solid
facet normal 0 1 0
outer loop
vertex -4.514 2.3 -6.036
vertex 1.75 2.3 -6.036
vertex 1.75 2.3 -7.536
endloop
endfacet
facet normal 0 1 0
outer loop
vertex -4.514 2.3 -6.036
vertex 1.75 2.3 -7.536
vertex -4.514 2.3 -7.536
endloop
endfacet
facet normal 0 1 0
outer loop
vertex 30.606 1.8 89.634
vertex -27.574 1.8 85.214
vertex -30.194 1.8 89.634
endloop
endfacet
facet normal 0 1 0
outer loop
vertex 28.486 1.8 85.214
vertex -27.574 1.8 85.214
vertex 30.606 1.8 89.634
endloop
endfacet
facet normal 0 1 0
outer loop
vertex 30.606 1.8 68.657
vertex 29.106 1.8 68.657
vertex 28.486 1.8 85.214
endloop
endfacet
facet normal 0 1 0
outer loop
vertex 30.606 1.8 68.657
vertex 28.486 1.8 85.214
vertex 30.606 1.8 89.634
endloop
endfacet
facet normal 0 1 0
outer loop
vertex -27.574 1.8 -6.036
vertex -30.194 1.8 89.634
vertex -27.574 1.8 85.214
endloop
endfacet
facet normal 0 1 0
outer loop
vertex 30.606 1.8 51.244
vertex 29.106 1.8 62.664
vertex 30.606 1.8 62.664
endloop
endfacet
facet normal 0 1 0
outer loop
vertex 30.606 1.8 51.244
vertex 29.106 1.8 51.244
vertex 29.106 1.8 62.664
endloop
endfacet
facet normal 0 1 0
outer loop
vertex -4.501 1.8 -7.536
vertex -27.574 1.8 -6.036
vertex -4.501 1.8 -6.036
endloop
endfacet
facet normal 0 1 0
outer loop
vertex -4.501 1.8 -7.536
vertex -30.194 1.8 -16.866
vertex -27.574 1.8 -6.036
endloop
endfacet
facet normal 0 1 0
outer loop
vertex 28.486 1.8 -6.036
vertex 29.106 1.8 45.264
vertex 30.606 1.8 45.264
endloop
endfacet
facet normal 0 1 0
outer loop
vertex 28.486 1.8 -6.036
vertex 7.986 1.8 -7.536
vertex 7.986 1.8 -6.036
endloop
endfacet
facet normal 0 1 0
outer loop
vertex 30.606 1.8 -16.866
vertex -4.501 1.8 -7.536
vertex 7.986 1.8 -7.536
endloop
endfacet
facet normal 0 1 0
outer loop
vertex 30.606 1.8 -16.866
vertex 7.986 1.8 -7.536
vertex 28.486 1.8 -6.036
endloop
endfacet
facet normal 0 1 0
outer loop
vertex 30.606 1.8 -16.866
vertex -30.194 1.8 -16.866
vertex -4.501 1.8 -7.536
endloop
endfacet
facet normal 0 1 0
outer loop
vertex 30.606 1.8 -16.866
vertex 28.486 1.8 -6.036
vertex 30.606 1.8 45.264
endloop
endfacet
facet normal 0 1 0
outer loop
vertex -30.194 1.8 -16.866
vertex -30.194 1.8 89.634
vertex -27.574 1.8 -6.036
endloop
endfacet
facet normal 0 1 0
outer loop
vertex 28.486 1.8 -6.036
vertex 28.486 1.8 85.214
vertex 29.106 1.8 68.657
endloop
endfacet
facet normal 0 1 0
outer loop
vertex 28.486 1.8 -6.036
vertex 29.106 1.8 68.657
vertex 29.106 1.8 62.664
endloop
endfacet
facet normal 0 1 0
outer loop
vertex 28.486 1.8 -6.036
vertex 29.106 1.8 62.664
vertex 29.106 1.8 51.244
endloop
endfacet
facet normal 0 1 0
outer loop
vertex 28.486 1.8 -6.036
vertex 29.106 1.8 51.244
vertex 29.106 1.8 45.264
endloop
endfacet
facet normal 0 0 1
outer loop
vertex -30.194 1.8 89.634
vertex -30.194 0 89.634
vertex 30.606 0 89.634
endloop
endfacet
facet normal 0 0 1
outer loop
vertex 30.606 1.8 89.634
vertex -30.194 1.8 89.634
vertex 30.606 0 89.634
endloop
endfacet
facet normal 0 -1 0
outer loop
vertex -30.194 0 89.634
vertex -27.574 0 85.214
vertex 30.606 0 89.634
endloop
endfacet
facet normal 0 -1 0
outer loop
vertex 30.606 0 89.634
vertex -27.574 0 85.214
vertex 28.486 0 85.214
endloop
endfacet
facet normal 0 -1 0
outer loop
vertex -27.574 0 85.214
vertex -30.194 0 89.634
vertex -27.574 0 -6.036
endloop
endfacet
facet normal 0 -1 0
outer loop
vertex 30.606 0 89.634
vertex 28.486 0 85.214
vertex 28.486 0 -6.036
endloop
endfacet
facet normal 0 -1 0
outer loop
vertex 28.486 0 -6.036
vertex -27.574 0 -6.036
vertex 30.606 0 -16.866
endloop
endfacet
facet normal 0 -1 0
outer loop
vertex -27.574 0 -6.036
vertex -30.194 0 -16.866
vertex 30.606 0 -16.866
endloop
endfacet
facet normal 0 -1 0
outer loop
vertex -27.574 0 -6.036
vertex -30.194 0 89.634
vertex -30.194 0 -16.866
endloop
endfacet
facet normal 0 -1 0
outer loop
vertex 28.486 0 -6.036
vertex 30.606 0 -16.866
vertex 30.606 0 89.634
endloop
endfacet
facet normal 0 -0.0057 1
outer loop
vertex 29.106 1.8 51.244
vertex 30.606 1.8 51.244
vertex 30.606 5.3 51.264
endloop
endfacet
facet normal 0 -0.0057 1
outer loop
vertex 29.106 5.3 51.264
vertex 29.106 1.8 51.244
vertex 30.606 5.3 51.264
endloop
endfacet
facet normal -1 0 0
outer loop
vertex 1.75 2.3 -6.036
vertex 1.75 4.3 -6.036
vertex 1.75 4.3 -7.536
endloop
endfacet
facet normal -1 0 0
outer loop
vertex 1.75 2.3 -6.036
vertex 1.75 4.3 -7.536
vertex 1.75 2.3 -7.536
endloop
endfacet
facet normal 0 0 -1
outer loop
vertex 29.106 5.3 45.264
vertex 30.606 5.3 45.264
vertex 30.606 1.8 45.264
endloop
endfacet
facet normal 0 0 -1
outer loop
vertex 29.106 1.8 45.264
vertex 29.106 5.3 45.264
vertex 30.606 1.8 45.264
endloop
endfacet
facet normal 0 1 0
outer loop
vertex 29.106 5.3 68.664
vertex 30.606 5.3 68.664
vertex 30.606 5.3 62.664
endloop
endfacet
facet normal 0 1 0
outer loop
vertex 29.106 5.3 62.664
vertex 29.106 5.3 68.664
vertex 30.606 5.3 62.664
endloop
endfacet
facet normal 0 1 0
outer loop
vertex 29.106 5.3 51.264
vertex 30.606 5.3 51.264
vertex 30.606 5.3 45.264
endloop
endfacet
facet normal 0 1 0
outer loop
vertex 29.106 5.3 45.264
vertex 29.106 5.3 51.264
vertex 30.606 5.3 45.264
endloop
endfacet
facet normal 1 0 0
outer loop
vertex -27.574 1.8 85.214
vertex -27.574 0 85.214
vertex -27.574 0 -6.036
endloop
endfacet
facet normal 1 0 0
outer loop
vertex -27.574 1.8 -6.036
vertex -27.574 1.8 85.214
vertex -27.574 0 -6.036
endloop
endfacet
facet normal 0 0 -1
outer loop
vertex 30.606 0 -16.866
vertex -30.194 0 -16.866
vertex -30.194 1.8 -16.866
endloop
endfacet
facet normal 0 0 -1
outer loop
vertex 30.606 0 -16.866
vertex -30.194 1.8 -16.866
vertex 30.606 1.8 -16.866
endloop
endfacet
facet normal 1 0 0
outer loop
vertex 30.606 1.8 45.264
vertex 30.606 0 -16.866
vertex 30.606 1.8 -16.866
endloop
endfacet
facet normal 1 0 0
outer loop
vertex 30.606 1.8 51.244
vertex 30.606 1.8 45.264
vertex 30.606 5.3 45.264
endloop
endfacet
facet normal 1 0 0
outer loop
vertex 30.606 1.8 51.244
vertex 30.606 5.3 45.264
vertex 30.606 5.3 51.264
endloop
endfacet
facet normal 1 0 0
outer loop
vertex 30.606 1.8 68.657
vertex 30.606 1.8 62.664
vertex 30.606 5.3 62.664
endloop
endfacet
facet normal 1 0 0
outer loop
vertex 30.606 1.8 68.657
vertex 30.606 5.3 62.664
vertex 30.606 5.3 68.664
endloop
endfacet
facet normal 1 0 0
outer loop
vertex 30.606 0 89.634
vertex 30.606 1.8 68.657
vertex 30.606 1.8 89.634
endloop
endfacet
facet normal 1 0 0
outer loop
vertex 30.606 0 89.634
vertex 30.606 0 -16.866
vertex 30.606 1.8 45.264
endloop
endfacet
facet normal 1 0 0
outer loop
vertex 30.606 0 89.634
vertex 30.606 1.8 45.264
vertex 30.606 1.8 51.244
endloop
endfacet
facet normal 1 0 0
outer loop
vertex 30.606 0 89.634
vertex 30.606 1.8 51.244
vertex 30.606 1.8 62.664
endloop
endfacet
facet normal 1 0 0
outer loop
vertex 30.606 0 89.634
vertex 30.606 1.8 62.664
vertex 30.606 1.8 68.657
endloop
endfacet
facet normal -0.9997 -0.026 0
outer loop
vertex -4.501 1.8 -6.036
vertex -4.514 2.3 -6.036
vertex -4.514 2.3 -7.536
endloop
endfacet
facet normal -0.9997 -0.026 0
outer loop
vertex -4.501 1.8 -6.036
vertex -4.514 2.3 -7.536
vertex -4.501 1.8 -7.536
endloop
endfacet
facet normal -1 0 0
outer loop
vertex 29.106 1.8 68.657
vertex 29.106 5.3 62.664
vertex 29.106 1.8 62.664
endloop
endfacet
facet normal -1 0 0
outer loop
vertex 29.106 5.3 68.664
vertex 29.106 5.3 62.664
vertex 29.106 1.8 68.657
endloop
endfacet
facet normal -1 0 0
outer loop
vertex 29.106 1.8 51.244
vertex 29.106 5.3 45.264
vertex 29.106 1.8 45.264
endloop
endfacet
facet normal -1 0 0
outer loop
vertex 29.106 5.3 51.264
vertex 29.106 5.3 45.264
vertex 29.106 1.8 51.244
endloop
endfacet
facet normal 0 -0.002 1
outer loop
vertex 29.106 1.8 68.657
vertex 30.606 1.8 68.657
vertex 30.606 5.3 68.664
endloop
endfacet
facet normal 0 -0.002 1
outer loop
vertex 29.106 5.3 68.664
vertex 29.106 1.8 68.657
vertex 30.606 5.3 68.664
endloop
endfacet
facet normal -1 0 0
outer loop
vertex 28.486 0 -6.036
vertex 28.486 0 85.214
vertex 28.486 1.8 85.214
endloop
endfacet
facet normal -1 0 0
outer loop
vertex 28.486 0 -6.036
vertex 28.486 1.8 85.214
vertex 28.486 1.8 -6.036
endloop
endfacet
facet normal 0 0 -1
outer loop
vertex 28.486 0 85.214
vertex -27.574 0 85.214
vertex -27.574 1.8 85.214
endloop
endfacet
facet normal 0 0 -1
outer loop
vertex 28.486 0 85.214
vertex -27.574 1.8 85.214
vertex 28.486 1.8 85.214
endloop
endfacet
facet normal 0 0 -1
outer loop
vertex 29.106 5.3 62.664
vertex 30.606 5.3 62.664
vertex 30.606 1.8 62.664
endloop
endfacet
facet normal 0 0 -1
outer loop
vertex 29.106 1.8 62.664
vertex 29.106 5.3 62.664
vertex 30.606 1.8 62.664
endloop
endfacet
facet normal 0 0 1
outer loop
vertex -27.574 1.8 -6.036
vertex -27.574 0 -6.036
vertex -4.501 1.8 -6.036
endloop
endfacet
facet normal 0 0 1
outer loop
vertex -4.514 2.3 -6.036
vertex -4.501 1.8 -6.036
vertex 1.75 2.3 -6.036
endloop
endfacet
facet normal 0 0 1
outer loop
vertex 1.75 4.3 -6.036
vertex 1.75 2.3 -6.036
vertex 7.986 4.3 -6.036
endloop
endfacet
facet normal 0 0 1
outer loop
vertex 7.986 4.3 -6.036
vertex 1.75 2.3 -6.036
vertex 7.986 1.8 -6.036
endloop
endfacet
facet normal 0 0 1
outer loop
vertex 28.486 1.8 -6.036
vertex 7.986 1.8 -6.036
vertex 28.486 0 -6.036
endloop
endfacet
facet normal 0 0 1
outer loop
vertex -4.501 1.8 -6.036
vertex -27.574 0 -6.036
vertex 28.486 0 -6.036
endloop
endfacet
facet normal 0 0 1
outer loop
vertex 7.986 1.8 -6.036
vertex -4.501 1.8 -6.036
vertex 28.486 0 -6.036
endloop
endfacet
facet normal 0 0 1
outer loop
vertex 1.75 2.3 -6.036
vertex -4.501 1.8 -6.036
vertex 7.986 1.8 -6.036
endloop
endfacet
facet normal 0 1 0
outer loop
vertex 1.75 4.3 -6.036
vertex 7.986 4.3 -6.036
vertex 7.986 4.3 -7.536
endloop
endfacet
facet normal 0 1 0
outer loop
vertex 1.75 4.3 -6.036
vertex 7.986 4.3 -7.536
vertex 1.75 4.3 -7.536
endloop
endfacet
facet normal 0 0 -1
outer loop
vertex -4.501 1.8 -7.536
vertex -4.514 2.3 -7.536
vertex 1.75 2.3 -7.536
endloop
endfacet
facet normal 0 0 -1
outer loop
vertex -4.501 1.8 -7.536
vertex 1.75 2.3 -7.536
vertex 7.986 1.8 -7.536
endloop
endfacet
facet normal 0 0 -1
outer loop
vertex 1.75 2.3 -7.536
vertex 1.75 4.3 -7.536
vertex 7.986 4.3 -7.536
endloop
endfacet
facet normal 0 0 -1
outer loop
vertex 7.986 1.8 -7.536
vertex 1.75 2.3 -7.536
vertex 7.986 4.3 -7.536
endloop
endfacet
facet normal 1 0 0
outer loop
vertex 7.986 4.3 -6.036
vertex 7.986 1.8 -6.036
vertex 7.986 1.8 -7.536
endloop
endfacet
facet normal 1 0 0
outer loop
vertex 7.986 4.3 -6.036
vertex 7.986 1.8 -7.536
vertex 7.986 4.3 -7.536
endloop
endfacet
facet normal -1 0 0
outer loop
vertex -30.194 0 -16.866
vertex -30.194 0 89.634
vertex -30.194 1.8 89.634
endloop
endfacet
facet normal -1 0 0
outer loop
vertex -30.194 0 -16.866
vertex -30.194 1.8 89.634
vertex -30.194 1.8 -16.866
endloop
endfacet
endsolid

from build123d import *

# Parameters (mm, degrees)
SKETCH1_W           = 56.06
SKETCH1_H           = 91.25
BOSS_EXTRUDE1_DEPTH = 1.8
BOSS_EXTRUDE2_DEPTH = 1.5
BOSS_EXTRUDE3_DEPTH = 1.5


with BuildPart() as part:
    # Sketch1 → Boss-Extrude1 (new body)
    # profile 1 of 2: a face of its own
    with BuildSketch(Plane(origin=(0, 0, 0), x_dir=(1, 0, 0), z_dir=(0, 1, 0))):
        Polygon((-30.193578772, 16.86607096), (30.606421228, 16.86607096), (30.606421228, -89.63392904), (-0.343578772, -89.63392904), (-30.193578772, -89.63392904), align=None)
        Polygon((-28.695861914, -88.133930777), (-28.695861914, 15.366069223), (29.104138086, 15.366069223), (29.104138086, -88.133930777), (-0.345861914, -88.133930777), align=None, mode=Mode.SUBTRACT)
    # profile 2 of 2: a face of its own
    with BuildSketch(Plane(origin=(0, 0, 0), x_dir=(1, 0, 0), z_dir=(0, 1, 0))):
        Polygon((-28.695861914, -88.133930777), (-0.345861914, -88.133930777), (29.104138086, -88.133930777), (29.104138086, 15.366069223), (-28.695861914, 15.366069223), align=None)
        with Locations((0.456421228, -39.58892904)):
            Rectangle(SKETCH1_W, SKETCH1_H, mode=Mode.SUBTRACT)
    extrude(amount=BOSS_EXTRUDE1_DEPTH)

    # Sketch4 → Boss-Extrude2 (add)
    with BuildSketch(Plane.XY.offset(-6.03607096)):
        Polygon((7.986421228, 1.8), (7.986421228, 4.3), (1.749686336, 4.3), (1.749686336, 2.3), (-4.513578772, 2.3), (-4.501292732, 1.8), (1.749686336, 1.8), align=None)
    extrude(amount=-BOSS_EXTRUDE2_DEPTH)

    # Sketch5 → Boss-Extrude3 (add)
    with BuildSketch(Plane(origin=(30.606421228, 0, 0), x_dir=(0, 0, -1), z_dir=(1, 0, 0))):
        Polygon((-68.657420773, 1.8), (-68.66392904, 5.3), (-62.66392904, 5.3), (-62.66392904, 1.8), align=None)
        Polygon((-51.24372118, 1.8), (-51.26392904, 5.3), (-45.26392904, 5.3), (-45.26392904, 1.8), align=None)
    extrude(amount=-BOSS_EXTRUDE3_DEPTH)


solid = part.part
